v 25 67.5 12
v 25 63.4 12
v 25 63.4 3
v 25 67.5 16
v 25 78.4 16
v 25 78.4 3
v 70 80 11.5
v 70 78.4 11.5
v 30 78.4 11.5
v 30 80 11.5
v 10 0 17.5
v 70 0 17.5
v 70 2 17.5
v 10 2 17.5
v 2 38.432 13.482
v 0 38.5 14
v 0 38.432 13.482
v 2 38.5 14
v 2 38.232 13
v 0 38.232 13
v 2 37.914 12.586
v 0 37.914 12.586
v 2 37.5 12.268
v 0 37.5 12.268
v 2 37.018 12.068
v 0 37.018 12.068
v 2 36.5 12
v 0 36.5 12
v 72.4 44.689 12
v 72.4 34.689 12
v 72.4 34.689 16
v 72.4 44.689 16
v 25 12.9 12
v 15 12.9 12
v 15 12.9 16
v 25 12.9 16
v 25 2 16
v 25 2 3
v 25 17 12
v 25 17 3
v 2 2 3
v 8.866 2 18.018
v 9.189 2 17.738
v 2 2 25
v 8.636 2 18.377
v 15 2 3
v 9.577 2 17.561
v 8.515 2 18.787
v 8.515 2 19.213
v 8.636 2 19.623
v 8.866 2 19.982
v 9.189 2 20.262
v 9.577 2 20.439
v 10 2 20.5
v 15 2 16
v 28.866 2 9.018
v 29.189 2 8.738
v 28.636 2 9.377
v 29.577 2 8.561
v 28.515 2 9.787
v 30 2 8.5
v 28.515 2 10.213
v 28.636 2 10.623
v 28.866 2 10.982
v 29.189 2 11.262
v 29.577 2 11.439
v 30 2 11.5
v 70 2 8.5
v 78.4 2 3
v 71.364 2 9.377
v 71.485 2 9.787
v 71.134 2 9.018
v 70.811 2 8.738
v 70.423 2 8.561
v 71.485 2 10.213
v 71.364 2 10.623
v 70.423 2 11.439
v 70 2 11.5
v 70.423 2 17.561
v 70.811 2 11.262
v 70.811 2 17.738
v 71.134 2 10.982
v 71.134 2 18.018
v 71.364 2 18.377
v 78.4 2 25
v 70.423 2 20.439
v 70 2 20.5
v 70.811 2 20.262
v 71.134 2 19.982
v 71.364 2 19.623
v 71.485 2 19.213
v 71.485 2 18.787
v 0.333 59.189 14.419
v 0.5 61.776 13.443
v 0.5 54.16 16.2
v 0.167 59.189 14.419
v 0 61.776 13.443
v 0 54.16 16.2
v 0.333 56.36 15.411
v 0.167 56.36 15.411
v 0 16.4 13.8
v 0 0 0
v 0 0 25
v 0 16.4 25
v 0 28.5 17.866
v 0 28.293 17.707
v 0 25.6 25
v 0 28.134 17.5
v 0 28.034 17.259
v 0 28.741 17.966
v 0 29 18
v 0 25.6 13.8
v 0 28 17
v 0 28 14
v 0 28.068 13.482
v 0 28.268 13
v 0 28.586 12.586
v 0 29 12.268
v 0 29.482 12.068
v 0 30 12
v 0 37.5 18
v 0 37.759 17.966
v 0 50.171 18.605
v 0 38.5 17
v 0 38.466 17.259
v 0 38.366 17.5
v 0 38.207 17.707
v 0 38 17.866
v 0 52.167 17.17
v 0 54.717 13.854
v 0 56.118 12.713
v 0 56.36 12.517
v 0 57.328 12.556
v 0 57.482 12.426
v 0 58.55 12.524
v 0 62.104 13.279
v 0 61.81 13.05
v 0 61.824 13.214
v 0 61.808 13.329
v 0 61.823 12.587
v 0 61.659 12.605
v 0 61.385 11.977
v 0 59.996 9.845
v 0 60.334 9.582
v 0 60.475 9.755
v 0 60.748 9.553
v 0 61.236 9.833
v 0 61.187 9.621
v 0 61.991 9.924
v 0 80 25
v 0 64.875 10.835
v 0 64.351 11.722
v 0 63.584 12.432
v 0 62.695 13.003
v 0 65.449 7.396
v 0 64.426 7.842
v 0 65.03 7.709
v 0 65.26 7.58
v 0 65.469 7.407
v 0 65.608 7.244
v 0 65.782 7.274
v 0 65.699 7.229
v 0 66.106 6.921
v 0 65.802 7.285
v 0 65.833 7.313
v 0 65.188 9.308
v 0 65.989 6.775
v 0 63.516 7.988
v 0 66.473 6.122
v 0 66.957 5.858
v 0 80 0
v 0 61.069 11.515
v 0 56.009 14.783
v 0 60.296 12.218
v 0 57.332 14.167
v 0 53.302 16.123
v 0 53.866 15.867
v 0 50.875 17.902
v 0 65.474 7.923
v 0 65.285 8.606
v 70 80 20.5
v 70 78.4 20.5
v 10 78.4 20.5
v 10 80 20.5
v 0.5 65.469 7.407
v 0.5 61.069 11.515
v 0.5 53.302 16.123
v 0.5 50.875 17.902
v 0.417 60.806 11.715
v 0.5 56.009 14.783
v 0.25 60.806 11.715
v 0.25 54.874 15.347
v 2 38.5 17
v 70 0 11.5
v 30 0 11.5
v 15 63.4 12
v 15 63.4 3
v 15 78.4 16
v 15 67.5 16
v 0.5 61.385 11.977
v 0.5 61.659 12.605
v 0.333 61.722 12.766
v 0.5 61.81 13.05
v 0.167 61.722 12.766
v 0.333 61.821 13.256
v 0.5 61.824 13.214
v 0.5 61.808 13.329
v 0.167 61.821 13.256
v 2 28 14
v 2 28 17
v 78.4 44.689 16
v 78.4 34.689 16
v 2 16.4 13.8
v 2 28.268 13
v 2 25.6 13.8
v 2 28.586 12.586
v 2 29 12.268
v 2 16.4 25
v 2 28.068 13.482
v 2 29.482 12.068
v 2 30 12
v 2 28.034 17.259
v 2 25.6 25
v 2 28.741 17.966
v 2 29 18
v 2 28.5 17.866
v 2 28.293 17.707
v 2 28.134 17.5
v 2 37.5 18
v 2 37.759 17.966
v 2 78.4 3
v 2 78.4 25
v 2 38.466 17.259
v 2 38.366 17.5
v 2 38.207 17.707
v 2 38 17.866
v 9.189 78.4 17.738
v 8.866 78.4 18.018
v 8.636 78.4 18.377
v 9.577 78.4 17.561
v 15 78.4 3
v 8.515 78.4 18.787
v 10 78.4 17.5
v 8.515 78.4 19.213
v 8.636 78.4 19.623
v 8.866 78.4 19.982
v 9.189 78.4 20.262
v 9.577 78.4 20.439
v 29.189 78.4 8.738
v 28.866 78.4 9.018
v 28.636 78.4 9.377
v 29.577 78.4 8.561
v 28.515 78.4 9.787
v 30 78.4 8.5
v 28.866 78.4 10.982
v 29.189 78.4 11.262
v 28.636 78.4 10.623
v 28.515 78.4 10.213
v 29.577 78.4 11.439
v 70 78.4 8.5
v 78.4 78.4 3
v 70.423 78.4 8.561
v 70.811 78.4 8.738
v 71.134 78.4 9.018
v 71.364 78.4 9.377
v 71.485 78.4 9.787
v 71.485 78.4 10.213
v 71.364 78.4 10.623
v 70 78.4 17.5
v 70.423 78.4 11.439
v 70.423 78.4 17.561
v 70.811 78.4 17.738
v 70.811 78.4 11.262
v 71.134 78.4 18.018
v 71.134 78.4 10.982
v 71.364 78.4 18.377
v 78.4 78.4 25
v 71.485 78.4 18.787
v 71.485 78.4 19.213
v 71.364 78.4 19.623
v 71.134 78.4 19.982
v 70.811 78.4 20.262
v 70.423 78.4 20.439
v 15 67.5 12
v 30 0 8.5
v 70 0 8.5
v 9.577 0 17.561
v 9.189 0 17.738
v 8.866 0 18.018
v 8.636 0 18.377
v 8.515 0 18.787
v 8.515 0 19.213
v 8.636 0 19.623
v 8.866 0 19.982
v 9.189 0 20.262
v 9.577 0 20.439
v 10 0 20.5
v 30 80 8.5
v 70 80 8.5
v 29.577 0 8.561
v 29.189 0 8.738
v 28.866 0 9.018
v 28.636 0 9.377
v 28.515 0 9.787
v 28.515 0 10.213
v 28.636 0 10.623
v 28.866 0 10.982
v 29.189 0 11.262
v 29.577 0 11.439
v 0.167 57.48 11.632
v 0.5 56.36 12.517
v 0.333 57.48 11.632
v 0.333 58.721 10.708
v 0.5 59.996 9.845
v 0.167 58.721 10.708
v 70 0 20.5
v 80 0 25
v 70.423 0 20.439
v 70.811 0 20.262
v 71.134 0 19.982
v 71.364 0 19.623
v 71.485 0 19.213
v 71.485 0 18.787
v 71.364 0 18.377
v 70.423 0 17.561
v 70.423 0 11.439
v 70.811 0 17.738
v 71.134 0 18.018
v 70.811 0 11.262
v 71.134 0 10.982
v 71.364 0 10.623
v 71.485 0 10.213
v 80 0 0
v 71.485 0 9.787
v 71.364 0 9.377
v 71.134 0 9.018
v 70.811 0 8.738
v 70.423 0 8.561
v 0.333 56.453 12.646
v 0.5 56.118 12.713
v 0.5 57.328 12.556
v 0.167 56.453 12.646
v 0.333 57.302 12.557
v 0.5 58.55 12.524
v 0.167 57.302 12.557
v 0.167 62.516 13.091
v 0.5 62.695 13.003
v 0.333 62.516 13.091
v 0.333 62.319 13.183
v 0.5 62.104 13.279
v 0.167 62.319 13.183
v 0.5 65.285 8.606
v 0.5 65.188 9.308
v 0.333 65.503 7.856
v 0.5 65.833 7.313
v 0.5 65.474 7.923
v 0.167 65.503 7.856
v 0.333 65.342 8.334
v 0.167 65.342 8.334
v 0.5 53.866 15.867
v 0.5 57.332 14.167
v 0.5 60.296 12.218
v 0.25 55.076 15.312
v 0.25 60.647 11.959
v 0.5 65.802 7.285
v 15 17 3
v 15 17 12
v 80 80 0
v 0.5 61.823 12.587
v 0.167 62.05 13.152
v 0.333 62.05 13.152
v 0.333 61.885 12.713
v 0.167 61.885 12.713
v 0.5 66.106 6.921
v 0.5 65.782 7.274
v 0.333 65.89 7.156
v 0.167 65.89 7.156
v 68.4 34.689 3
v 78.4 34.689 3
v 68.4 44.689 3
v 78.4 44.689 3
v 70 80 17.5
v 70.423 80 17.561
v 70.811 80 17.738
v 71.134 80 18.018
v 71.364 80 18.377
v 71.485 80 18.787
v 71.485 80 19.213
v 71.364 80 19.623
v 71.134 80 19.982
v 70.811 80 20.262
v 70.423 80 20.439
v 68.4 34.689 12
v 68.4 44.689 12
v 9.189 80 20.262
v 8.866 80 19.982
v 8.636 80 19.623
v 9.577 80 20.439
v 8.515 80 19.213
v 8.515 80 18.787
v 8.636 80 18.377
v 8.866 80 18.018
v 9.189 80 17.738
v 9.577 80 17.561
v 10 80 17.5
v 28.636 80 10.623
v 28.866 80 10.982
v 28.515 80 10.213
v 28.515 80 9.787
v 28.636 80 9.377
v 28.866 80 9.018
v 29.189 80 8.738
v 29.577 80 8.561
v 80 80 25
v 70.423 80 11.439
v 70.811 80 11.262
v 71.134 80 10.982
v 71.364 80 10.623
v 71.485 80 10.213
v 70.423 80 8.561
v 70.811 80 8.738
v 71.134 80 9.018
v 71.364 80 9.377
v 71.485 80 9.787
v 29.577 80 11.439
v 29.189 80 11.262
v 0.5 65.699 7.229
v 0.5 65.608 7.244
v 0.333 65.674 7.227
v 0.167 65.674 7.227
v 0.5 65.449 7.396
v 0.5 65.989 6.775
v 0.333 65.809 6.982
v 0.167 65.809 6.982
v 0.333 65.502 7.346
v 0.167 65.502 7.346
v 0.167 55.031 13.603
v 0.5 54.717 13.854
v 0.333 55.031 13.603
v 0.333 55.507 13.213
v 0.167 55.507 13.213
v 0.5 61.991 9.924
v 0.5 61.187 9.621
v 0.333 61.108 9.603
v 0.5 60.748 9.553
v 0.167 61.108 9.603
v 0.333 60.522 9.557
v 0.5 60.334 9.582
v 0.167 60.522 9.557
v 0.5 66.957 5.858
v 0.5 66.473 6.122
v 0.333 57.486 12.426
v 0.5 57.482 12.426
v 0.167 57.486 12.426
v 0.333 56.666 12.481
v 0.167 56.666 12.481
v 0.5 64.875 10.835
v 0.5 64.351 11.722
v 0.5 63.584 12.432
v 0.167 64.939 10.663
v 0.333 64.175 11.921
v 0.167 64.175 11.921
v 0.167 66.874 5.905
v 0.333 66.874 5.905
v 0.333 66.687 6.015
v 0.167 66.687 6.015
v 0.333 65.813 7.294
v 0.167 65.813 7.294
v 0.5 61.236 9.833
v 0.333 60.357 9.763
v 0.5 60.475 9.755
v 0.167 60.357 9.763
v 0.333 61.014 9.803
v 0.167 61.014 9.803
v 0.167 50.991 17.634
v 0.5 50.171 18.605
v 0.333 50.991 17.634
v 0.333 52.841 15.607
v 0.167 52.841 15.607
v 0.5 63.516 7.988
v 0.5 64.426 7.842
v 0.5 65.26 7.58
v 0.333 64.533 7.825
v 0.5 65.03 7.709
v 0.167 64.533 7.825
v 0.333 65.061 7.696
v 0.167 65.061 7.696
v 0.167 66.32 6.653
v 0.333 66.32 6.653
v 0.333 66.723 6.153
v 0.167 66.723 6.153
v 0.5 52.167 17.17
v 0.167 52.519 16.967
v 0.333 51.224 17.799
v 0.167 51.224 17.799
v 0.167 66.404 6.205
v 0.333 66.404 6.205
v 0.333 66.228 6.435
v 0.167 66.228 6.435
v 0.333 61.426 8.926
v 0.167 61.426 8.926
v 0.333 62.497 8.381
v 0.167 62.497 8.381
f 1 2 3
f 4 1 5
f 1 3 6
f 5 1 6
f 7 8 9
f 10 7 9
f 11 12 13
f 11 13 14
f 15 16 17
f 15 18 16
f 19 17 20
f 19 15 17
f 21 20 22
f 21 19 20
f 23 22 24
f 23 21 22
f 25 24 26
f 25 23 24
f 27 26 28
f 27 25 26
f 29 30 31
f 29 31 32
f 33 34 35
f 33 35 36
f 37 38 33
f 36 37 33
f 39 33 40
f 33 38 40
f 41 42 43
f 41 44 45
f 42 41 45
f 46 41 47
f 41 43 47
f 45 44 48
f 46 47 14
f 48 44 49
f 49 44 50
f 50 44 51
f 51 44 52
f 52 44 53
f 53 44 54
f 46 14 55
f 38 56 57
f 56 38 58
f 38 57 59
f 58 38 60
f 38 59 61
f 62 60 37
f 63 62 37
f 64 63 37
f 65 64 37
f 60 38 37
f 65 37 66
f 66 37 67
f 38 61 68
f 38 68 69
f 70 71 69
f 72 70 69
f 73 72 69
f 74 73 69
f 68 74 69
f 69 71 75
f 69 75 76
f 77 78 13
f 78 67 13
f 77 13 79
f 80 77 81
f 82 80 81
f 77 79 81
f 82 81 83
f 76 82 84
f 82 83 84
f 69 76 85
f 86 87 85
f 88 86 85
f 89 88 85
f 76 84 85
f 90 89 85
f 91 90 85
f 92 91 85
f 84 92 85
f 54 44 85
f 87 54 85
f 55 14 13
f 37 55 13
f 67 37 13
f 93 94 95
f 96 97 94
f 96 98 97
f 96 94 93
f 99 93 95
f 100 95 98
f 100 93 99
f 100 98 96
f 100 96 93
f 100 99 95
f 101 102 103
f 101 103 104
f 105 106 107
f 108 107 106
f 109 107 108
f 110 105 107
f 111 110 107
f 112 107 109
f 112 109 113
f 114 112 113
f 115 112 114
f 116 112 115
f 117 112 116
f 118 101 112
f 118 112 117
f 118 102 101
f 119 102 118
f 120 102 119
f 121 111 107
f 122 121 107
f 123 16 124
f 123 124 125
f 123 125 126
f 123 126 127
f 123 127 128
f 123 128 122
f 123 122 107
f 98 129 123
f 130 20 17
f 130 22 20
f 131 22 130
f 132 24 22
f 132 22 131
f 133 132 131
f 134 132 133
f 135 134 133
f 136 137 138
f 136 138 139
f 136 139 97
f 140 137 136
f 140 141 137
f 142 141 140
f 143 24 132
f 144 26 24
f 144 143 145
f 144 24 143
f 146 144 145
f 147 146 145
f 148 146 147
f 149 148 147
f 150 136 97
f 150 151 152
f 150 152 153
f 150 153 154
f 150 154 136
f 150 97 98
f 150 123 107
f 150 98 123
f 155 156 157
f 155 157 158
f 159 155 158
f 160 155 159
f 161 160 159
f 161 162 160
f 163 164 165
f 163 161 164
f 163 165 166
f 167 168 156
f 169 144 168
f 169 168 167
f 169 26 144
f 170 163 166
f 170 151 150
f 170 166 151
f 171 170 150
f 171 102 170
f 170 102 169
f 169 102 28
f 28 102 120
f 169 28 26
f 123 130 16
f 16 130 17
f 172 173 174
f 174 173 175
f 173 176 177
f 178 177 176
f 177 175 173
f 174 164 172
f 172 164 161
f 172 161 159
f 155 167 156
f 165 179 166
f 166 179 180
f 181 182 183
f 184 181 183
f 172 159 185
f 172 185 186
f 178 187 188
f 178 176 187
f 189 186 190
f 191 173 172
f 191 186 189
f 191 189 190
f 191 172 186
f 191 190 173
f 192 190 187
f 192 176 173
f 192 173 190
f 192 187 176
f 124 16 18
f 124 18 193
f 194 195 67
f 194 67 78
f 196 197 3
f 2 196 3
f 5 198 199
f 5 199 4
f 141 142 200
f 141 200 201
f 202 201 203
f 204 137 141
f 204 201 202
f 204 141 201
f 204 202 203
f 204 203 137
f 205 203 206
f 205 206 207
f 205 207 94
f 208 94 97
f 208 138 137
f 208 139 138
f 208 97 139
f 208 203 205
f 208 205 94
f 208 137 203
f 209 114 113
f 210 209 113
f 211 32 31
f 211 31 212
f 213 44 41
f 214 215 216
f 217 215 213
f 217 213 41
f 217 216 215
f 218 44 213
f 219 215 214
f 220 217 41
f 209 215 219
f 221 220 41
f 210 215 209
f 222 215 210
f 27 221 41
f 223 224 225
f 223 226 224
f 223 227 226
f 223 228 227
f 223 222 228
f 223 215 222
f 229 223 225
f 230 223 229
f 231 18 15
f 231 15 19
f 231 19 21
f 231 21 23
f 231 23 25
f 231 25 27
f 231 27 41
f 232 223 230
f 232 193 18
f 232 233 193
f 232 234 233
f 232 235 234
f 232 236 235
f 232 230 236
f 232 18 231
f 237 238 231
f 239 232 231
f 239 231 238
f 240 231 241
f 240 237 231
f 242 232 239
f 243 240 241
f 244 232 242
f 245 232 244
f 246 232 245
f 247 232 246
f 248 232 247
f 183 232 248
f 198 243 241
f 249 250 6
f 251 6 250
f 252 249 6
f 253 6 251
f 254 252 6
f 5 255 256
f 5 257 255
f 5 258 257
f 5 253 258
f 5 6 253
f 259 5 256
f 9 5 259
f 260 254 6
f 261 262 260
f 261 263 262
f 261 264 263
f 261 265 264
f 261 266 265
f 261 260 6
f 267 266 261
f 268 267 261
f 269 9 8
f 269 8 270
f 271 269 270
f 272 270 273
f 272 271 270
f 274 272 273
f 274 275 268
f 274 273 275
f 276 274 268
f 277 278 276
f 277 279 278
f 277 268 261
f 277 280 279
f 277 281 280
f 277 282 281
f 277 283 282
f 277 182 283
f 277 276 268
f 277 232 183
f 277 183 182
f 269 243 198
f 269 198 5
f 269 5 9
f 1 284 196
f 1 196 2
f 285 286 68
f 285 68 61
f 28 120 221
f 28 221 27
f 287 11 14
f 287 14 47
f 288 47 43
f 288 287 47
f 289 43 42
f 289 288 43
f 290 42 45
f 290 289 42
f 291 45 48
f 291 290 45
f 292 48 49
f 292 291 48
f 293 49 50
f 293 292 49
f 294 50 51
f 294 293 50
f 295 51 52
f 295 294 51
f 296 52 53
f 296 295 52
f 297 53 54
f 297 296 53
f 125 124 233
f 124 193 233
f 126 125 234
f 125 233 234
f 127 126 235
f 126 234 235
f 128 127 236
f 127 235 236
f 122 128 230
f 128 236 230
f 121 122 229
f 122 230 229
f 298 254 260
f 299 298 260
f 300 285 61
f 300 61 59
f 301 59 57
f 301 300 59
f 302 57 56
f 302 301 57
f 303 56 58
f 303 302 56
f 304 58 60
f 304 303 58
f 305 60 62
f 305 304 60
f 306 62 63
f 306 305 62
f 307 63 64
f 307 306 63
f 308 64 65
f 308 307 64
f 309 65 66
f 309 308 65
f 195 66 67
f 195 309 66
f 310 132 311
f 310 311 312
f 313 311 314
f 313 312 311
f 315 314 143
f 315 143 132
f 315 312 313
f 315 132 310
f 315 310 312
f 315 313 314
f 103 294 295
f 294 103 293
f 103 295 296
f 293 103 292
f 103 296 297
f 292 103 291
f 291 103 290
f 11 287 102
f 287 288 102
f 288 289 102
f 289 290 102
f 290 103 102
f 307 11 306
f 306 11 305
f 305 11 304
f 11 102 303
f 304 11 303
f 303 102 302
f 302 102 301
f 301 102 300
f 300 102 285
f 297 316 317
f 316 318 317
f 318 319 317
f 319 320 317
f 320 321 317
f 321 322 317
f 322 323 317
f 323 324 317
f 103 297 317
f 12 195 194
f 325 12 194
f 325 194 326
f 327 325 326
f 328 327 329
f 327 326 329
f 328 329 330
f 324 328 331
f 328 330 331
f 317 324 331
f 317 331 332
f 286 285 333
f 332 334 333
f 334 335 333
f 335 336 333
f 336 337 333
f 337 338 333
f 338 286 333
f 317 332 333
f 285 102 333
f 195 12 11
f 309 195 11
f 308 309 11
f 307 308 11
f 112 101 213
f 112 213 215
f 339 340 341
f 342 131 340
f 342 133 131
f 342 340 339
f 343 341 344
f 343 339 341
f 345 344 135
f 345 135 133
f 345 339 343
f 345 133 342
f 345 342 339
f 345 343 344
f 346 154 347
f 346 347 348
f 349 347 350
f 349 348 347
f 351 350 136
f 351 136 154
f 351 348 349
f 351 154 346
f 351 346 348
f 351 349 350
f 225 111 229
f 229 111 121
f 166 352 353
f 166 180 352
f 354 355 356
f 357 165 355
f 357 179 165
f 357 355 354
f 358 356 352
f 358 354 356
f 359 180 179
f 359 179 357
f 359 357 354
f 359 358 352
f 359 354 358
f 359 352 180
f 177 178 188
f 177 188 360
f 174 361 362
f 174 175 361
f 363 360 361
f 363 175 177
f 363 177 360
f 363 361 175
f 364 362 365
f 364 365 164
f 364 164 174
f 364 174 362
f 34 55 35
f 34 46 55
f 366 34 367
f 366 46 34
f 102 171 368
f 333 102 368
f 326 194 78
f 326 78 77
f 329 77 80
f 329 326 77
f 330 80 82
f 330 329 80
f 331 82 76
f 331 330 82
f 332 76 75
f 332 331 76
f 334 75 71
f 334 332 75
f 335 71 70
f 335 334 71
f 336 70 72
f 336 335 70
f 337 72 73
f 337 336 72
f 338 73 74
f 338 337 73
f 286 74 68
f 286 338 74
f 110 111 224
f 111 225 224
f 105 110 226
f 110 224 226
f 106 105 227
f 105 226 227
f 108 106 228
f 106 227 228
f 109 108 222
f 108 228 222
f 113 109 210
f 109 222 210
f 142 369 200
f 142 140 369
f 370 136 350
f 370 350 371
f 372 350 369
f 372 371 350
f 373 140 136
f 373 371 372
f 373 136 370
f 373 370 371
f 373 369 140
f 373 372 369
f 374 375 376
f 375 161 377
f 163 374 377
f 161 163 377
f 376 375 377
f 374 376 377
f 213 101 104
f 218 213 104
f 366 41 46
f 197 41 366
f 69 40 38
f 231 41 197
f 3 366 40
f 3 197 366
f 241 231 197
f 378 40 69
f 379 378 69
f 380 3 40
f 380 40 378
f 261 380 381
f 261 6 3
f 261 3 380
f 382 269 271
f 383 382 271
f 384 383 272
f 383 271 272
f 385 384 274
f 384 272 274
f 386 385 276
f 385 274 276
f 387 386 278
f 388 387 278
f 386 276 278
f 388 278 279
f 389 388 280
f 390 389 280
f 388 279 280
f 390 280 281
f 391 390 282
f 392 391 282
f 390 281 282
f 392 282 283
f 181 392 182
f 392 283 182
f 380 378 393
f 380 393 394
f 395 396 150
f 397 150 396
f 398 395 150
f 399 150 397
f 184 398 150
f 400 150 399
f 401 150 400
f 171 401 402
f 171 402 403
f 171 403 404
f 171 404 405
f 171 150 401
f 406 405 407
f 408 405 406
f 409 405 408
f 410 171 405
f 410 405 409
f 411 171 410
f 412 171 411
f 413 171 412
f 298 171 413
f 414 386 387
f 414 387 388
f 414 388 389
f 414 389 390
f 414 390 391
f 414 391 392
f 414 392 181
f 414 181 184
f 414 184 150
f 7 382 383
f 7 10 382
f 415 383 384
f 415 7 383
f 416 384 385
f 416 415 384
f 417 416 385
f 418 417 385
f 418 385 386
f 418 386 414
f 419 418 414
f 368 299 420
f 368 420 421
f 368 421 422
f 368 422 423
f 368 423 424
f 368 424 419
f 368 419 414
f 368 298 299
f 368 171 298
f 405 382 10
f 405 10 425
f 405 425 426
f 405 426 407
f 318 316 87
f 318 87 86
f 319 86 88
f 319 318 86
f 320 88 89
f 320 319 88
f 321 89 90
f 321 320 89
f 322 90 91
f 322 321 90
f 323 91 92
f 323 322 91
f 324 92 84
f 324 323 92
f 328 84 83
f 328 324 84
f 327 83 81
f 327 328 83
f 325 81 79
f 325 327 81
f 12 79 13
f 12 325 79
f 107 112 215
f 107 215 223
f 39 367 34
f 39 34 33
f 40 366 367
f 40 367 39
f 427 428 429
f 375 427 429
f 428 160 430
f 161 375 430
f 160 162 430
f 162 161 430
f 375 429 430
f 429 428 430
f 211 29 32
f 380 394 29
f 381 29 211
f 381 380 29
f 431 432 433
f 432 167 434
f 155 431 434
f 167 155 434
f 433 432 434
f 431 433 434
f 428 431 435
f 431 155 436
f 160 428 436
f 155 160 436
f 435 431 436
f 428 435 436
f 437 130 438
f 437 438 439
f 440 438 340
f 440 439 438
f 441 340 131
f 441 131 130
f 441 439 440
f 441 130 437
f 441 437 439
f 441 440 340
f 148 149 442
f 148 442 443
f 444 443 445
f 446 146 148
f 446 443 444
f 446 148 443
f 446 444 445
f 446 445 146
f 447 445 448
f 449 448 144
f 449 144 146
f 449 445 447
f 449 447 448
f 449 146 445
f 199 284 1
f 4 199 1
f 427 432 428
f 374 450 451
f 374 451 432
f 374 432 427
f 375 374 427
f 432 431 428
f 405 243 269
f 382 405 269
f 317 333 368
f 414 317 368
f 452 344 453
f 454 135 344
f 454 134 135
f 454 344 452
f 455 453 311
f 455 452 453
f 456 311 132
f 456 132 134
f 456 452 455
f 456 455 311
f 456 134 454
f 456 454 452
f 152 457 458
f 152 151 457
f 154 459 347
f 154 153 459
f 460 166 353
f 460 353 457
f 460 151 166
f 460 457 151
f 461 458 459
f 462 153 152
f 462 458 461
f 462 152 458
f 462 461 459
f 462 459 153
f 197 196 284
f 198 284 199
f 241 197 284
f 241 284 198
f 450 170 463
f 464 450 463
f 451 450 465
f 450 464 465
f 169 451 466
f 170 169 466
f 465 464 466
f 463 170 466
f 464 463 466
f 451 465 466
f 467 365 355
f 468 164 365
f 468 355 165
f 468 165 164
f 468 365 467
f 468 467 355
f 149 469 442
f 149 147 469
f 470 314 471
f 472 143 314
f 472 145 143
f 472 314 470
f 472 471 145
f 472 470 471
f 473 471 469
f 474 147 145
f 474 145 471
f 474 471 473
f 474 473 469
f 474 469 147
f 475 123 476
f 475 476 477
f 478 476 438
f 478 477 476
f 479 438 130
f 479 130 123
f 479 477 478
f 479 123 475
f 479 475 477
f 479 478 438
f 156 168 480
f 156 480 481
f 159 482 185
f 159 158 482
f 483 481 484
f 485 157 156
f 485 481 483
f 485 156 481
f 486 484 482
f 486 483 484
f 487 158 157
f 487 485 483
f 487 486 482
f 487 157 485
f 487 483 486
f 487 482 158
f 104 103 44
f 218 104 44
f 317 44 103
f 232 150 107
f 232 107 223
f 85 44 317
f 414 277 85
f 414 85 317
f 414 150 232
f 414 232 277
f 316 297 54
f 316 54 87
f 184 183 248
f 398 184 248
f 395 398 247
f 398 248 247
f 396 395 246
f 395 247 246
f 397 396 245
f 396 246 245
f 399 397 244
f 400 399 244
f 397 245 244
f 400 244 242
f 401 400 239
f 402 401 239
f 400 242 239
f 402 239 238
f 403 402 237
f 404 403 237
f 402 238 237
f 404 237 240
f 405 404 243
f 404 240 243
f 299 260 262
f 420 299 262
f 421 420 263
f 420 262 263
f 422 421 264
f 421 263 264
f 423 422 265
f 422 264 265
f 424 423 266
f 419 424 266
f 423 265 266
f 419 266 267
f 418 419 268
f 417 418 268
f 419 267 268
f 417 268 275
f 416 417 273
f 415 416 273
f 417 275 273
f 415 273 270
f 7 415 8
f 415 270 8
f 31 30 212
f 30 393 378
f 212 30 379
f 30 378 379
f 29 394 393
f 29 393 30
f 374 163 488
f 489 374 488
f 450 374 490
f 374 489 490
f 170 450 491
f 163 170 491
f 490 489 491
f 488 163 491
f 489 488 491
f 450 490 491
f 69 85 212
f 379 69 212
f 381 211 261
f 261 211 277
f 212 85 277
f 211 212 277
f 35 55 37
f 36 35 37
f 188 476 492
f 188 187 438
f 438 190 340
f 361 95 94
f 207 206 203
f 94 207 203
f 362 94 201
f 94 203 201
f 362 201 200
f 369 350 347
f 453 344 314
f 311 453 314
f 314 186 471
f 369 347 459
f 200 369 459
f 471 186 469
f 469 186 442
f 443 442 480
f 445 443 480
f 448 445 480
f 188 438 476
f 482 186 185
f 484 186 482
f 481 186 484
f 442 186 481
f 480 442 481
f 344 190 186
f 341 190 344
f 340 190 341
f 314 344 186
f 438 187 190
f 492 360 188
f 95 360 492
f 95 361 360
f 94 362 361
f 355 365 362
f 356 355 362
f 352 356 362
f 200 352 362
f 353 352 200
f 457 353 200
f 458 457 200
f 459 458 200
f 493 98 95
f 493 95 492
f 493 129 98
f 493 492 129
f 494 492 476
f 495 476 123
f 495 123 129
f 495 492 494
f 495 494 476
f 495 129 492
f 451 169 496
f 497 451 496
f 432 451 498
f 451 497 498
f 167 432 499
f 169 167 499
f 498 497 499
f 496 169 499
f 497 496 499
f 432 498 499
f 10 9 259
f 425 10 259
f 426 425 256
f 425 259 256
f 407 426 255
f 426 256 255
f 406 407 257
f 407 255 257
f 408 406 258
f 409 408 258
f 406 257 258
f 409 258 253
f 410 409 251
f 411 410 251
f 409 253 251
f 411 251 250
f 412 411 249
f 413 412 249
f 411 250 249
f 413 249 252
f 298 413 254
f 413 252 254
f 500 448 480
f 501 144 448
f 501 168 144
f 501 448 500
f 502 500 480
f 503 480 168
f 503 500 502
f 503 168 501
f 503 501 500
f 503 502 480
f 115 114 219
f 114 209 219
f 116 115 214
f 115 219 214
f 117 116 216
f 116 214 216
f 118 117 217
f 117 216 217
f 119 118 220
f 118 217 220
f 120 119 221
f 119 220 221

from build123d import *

# Parameters (mm, degrees)
ESQUISSE1_W             = 80
ESQUISSE1_H             = 80
BOSS_EXTRU_1_DEPTH      = 25
ESQUISSE2_W             = 76.4
ESQUISSE2_H             = 76.4
ENL_V_MAT_EXTRU_3_DEPTH = 22
ESQUISSE3_W             = 10
ESQUISSE3_H             = 15
ESQUISSE3_H_2           = 10
BOSS_EXTRU_2_DEPTH      = 9
ESQUISSE4_W             = 10
ESQUISSE4_H             = 10.9
ESQUISSE4_W_2           = 6
ESQUISSE4_H_2           = 10
BOSS_EXTRU_3_DEPTH      = 4
ESQUISSE5_W             = 11.2
ESQUISSE5_H             = 9.2
ESQUISSE5_W_2           = 6
ESQUISSE5_H_2           = 10.5
ENL_V_MAT_EXTRU_4_DEPTH = 10
CONG_2_R                = 2
CONG_3_R                = 1
ENL_V_MAT_EXTRU_5_DEPTH = 0.5
ENL_V_MAT_EXTRU_6_DEPTH = 0.5
ENL_V_MAT_EXTRU_7_DEPTH = 2
ENL_V_START             = -2
ENL_V_MAT_EXTRU_8_DEPTH = 2


with BuildPart() as part:
    # Esquisse1 → Boss.-Extru.1 (new body)
    with BuildSketch(Plane.XY):
        with Locations((40, 40)):
            Rectangle(ESQUISSE1_W, ESQUISSE1_H)
    extrude(amount=BOSS_EXTRU_1_DEPTH)

    # Esquisse2 → Enlèv. mat.-Extru.3 (cut)
    with BuildSketch(Plane.XY.offset(25)):
        with Locations((40.2, 40.2)):
            Rectangle(ESQUISSE2_W, ESQUISSE2_H)
    extrude(amount=-ENL_V_MAT_EXTRU_3_DEPTH, mode=Mode.SUBTRACT)

    # Esquisse3 → Boss.-Extru.2 (add)
    with BuildSketch(Plane.XY.offset(3)):
        with Locations((20, 9.5)):
            Rectangle(ESQUISSE3_W, ESQUISSE3_H)
        with Locations((73.4, 39.688534772)):
            Rectangle(ESQUISSE3_W, ESQUISSE3_H_2)
        with Locations((20, 70.9)):
            Rectangle(ESQUISSE3_W, ESQUISSE3_H)
    extrude(amount=BOSS_EXTRU_2_DEPTH)

    # Esquisse4 → Boss.-Extru.3 (add)
    with BuildSketch(Plane.XY.offset(12)):
        with Locations((20, 7.45)):
            Rectangle(ESQUISSE4_W, ESQUISSE4_H)
        with Locations((20, 72.95)):
            Rectangle(ESQUISSE4_W, ESQUISSE4_H)
        with Locations((75.4, 39.688534772)):
            Rectangle(ESQUISSE4_W_2, ESQUISSE4_H_2)
    extrude(amount=BOSS_EXTRU_3_DEPTH)

    # Esquisse5 → Enlèv. mat.-Extru.4 (cut)
    with BuildSketch(Plane.ZY):
        with Locations((19.4, 21)):
            Rectangle(ESQUISSE5_W, ESQUISSE5_H)
        with Locations((15, 33.25)):
            Rectangle(ESQUISSE5_W_2, ESQUISSE5_H_2)
    extrude(amount=-ENL_V_MAT_EXTRU_4_DEPTH, mode=Mode.SUBTRACT)

    # Congé2
    cong_2_edges = [part.edges().sort_by_distance(p)[0] for p in [
        (1, 28, 12),
        (1, 38.5, 12),
    ]]
    fillet(cong_2_edges, radius=CONG_2_R)

    # Congé3
    cong_3_edges = [part.edges().sort_by_distance(p)[0] for p in [
        (1, 38.5, 18),
        (1, 28, 18),
    ]]
    fillet(cong_3_edges, radius=CONG_3_R)

    # Esquisse8 → Enlèv. mat.-Extru.5 (cut)
    with BuildSketch(Plane.ZY):
        with BuildLine():
            add(Edge.make_bspline(
                [(7.313237468, 65.833159363), (7.48897389, 65.712447359), (7.804126252, 65.49597161), (8.487346274, 65.283616184), (8.981094379, 65.226001547), (9.307707678, 65.18788959)],
                knots=[0, 0, 0, 0, 0.299076085, 0.536340353, 1, 1, 1, 1], degree=3))
            add(Edge.make_bspline(
                [(7.284702647, 65.80245585), (7.293856567, 65.81317431), (7.303547017, 65.823166837), (7.313237468, 65.833159363)],
                knots=[0.816445355, 0.816445355, 0.816445355, 0.816445355, 1, 1, 1, 1], degree=3))
            add(Edge.make_bspline(
                [(17.901527847, 50.874632789), (17.356129628, 51.530826995), (16.293469748, 52.809362994), (15.275532925, 55.228252674), (13.933854466, 57.885340246), (11.93358483, 60.745765414), (9.727873266, 63.52670077), (8.030552607, 65.116137898), (7.284702647, 65.80245585)],
                knots=[0, 0, 0, 0, 0.134488449, 0.262038771, 0.413324325, 0.606278792, 0.814215894, 0.974718857, 0.974718857, 0.974718857, 0.974718857], degree=3))
            add(Edge.make_bspline(
                [(7.407085151, 65.469076199), (7.997724667, 64.952415937), (9.572762834, 63.532102924), (11.741354127, 60.845320938), (13.846315376, 57.844082794), (15.265007359, 55.100127721), (16.333677342, 52.722721211), (17.367018575, 51.504680356), (17.901527847, 50.874632789)],
                knots=[0.043476968, 0.043476968, 0.043476968, 0.043476968, 0.167785205, 0.379770977, 0.589080615, 0.748039182, 0.869669971, 1, 1, 1, 1], degree=3))
            add(Edge.make_bspline(
                [(7.987837686, 63.516054267), (7.933705658, 63.852405499), (7.85098554, 64.366389832), (7.741769984, 65.069503506), (7.523361561, 65.343113704), (7.407085151, 65.469076199)],
                knots=[0, 0, 0, 0, 0.449393835, 0.686726756, 0.906490115, 0.906490115, 0.906490115, 0.906490115], degree=3))
            add(Edge.make_bspline(
                [(9.581947331, 60.333994368), (9.35896114, 60.695257019), (8.925646923, 61.397274669), (8.371533969, 62.453225866), (8.111622296, 63.17317422), (7.987837686, 63.516054267)],
                knots=[0, 0, 0, 0, 0.357022344, 0.693777745, 1, 1, 1, 1], degree=3))
            add(Edge.make_bspline(
                [(9.923647007, 61.990871165), (9.797152593, 61.702831345), (9.59150409, 61.234550131), (9.533644523, 60.653068807), (9.572467818, 60.3966133), (9.581947331, 60.333994368)],
                knots=[0, 0, 0, 0, 0.547075637, 0.889409121, 1, 1, 1, 1], degree=3))
            add(Edge.make_bspline(
                [(9.845334721, 59.996400955), (9.811598018, 60.115915835), (9.717723572, 60.448473327), (9.824688072, 61.125443291), (9.886572886, 61.666645995), (9.923647007, 61.990871165)],
                knots=[0, 0, 0, 0, 0.183614026, 0.510917298, 1, 1, 1, 1], degree=3))
            add(Edge.make_bspline(
                [(12.516751585, 56.360012475), (12.220146813, 56.731946706), (11.602008437, 57.507075242), (10.696458869, 58.709807691), (10.128597293, 59.568209935), (9.845334721, 59.996400955)],
                knots=[0, 0, 0, 0, 0.316155138, 0.658882265, 1, 1, 1, 1], degree=3))
            add(Edge.make_bspline(
                [(12.5243775, 58.549530139), (12.475747631, 58.195383202), (12.389698733, 57.568732254), (12.460969789, 56.835777723), (12.504804941, 56.461905897), (12.516751585, 56.360012475)],
                knots=[0, 0, 0, 0, 0.485970736, 0.859908672, 1, 1, 1, 1], degree=3))
            add(Edge.make_bspline(
                [(12.712972257, 56.117743005), (12.689100366, 56.22919998), (12.605595842, 56.619079516), (12.538586692, 57.433441747), (12.529671109, 58.133733427), (12.5243775, 58.549530139)],
                knots=[0, 0, 0, 0, 0.139880518, 0.489305866, 1, 1, 1, 1], degree=3))
            add(Edge.make_bspline(
                [(13.853926539, 54.716920987), (13.770782279, 54.821999659), (13.560207416, 55.088126596), (13.175056735, 55.551153097), (12.879119476, 55.914019785), (12.712972257, 56.117743005)],
                knots=[0, 0, 0, 0, 0.222488299, 0.563483801, 1, 1, 1, 1], degree=3))
            add(Edge.make_bspline(
                [(18.605458509, 50.170702126), (18.280931893, 50.44303874), (17.255771256, 51.303334203), (15.614574097, 52.765406202), (14.427661827, 54.080988547), (13.853926539, 54.716920987)],
                knots=[0, 0, 0, 0, 0.193087, 0.609950563, 1, 1, 1, 1], degree=3))
            add(Edge.make_bspline(
                [(16.20036208, 54.159642546), (16.438779976, 53.603827531), (16.879859527, 52.575554733), (17.742560122, 51.269607993), (18.332407028, 50.518434698), (18.605458509, 50.170702126)],
                knots=[0, 0, 0, 0, 0.387194684, 0.716320628, 1, 1, 1, 1], degree=3))
            add(Edge.make_bspline(
                [(13.443300319, 61.775879008), (13.77418719, 60.915642263), (14.463863001, 59.122629222), (15.329762312, 56.564659638), (15.935132531, 54.892334677), (16.20036208, 54.159642546)],
                knots=[0, 0, 0, 0, 0.341315206, 0.711411851, 1, 1, 1, 1], degree=3))
            add(Edge.make_bspline(
                [(11.976778106, 61.384610882), (12.233772331, 61.501042009), (12.640271025, 61.685206075), (13.157414565, 61.862407498), (13.381058534, 61.794717609), (13.443300319, 61.775879008)],
                knots=[0, 0, 0, 0, 0.553685075, 0.875787227, 1, 1, 1, 1], degree=3))
            add(Edge.make_bspline(
                [(13.279343135, 62.10408668), (13.23692898, 62.085588167), (13.051332425, 62.004642073), (12.566317448, 61.865427123), (12.210103671, 61.574906445), (11.976778106, 61.384610882)],
                knots=[0, 0, 0, 0, 0.092717793, 0.405716039, 1, 1, 1, 1], degree=3))
            add(Edge.make_bspline(
                [(13.003343655, 62.694801827), (13.032902353, 62.635423942), (13.094815074, 62.511052886), (13.186462069, 62.313925775), (13.247594869, 62.175813112), (13.279343135, 62.10408668)],
                knots=[0, 0, 0, 0, 0.305139846, 0.639136348, 1, 1, 1, 1], degree=3))
            add(Edge.make_bspline(
                [(9.307707678, 65.18788959), (9.767844099, 65.137295561), (10.719249787, 65.03268431), (12.109364501, 64.17933924), (12.684347555, 63.224525191), (13.003343655, 62.694801827)],
                knots=[0, 0, 0, 0, 0.294280708, 0.608472459, 1, 1, 1, 1], degree=3))
        make_face()
    extrude(amount=-ENL_V_MAT_EXTRU_5_DEPTH, mode=Mode.SUBTRACT)

    # Esquisse11 → Enlèv. mat.-Extru.6 (cut)
    with BuildSketch(Plane.ZY):
        with BuildLine():
            add(Edge.make_bspline(
                [(7.243895568, 65.607536557), (7.235472734, 65.629492421), (7.214919328, 65.683069137), (7.244525992, 65.745776075), (7.269630044, 65.777003976), (7.274021635, 65.782146154)],
                knots=[0, 0, 0, 0, 0.298493917, 0.728385063, 0.816445355, 0.816445355, 0.816445355, 0.816445355], degree=3))
            add(Edge.make_bspline(
                [(7.274021635, 65.782146154), (7.156541314, 65.890249469), (7.038900997, 65.998201789), (6.921260681, 66.10615411)],
                knots=[0.974718857, 0.974718857, 0.974718857, 0.974718857, 1, 1, 1, 1], degree=3))
            add(Edge.make_bspline(
                [(6.921260681, 66.10615411), (6.831714942, 66.177342754), (6.574667912, 66.381694519), (6.223380928, 66.669125539), (5.956637647, 66.879112302), (5.858032076, 66.956736993)],
                knots=[0, 0, 0, 0, 0.25204317, 0.723506773, 1, 1, 1, 1], degree=3))
            add(Edge.make_bspline(
                [(5.858032076, 66.956736993), (5.873494425, 66.928903501), (5.924043753, 66.837910578), (6.022316687, 66.682245025), (6.087700791, 66.544864522), (6.122006074, 66.472784663)],
                knots=[0, 0, 0, 0, 0.173191566, 0.566195825, 1, 1, 1, 1], degree=3))
            add(Edge.make_bspline(
                [(6.122006074, 66.472784663), (6.149493678, 66.44984741), (6.251171186, 66.365001792), (6.467685513, 66.201886466), (6.660833558, 66.067810503), (6.774608459, 65.988832333)],
                knots=[0, 0, 0, 0, 0.132137543, 0.488780926, 1, 1, 1, 1], degree=3))
            add(Edge.make_bspline(
                [(6.774608459, 65.988832333), (6.982217829, 65.809150718), (7.189827198, 65.629469103), (7.396404139, 65.448766503)],
                knots=[0, 0, 0, 0, 0.043476968, 0.043476968, 0.043476968, 0.043476968], degree=3))
            add(Edge.make_bspline(
                [(7.396404139, 65.448766503), (7.346928222, 65.502363874), (7.295411895, 65.554950216), (7.243895568, 65.607536557)],
                knots=[0.906490115, 0.906490115, 0.906490115, 0.906490115, 1, 1, 1, 1], degree=3))
        make_face()
    extrude(amount=-ENL_V_MAT_EXTRU_6_DEPTH, mode=Mode.SUBTRACT)

    # Esquisse12 → Enlèv. mat.-Extru.7 (cut)
    with BuildSketch(Plane(origin=(0, 0, 0), x_dir=(-1, 0, 0), z_dir=(0, -1, 0))):
        with BuildLine():
            Line((-10, -20.5), (-70, -20.5))
            ThreePointArc((-70, -20.5), (-71.5, -19), (-70, -17.5))
            Line((-70, -17.5), (-10, -17.5))
            ThreePointArc((-10, -17.5), (-8.5, -19), (-10, -20.5))
        make_face()
        with BuildLine():
            Line((-70, -8.5), (-30, -8.5))
            ThreePointArc((-30, -8.5), (-28.5, -10), (-30, -11.5))
            Line((-30, -11.5), (-70, -11.5))
            ThreePointArc((-70, -11.5), (-71.5, -10), (-70, -8.5))
        make_face()
    extrude(amount=-ENL_V_MAT_EXTRU_7_DEPTH, mode=Mode.SUBTRACT)

    # Esquisse14 → Enlèv. mat.-Extru.8 (cut)
    with BuildSketch(Plane(origin=(0, 80, 0), x_dir=(1, 0, 0), z_dir=(0, 1, 0)).offset(ENL_V_START)):
        with BuildLine():
            Line((70, -20.5), (10, -20.5))
            ThreePointArc((10, -20.5), (8.5, -19), (10, -17.5))
            Line((10, -17.5), (70, -17.5))
            ThreePointArc((70, -17.5), (71.5, -19), (70, -20.5))
        make_face()
        with BuildLine():
            Line((70, -11.5), (30, -11.5))
            ThreePointArc((30, -11.5), (28.5, -10), (30, -8.5))
            Line((30, -8.5), (70, -8.5))
            ThreePointArc((70, -8.5), (71.5, -10), (70, -11.5))
        make_face()
    extrude(amount=ENL_V_MAT_EXTRU_8_DEPTH, mode=Mode.SUBTRACT)


solid = part.part
